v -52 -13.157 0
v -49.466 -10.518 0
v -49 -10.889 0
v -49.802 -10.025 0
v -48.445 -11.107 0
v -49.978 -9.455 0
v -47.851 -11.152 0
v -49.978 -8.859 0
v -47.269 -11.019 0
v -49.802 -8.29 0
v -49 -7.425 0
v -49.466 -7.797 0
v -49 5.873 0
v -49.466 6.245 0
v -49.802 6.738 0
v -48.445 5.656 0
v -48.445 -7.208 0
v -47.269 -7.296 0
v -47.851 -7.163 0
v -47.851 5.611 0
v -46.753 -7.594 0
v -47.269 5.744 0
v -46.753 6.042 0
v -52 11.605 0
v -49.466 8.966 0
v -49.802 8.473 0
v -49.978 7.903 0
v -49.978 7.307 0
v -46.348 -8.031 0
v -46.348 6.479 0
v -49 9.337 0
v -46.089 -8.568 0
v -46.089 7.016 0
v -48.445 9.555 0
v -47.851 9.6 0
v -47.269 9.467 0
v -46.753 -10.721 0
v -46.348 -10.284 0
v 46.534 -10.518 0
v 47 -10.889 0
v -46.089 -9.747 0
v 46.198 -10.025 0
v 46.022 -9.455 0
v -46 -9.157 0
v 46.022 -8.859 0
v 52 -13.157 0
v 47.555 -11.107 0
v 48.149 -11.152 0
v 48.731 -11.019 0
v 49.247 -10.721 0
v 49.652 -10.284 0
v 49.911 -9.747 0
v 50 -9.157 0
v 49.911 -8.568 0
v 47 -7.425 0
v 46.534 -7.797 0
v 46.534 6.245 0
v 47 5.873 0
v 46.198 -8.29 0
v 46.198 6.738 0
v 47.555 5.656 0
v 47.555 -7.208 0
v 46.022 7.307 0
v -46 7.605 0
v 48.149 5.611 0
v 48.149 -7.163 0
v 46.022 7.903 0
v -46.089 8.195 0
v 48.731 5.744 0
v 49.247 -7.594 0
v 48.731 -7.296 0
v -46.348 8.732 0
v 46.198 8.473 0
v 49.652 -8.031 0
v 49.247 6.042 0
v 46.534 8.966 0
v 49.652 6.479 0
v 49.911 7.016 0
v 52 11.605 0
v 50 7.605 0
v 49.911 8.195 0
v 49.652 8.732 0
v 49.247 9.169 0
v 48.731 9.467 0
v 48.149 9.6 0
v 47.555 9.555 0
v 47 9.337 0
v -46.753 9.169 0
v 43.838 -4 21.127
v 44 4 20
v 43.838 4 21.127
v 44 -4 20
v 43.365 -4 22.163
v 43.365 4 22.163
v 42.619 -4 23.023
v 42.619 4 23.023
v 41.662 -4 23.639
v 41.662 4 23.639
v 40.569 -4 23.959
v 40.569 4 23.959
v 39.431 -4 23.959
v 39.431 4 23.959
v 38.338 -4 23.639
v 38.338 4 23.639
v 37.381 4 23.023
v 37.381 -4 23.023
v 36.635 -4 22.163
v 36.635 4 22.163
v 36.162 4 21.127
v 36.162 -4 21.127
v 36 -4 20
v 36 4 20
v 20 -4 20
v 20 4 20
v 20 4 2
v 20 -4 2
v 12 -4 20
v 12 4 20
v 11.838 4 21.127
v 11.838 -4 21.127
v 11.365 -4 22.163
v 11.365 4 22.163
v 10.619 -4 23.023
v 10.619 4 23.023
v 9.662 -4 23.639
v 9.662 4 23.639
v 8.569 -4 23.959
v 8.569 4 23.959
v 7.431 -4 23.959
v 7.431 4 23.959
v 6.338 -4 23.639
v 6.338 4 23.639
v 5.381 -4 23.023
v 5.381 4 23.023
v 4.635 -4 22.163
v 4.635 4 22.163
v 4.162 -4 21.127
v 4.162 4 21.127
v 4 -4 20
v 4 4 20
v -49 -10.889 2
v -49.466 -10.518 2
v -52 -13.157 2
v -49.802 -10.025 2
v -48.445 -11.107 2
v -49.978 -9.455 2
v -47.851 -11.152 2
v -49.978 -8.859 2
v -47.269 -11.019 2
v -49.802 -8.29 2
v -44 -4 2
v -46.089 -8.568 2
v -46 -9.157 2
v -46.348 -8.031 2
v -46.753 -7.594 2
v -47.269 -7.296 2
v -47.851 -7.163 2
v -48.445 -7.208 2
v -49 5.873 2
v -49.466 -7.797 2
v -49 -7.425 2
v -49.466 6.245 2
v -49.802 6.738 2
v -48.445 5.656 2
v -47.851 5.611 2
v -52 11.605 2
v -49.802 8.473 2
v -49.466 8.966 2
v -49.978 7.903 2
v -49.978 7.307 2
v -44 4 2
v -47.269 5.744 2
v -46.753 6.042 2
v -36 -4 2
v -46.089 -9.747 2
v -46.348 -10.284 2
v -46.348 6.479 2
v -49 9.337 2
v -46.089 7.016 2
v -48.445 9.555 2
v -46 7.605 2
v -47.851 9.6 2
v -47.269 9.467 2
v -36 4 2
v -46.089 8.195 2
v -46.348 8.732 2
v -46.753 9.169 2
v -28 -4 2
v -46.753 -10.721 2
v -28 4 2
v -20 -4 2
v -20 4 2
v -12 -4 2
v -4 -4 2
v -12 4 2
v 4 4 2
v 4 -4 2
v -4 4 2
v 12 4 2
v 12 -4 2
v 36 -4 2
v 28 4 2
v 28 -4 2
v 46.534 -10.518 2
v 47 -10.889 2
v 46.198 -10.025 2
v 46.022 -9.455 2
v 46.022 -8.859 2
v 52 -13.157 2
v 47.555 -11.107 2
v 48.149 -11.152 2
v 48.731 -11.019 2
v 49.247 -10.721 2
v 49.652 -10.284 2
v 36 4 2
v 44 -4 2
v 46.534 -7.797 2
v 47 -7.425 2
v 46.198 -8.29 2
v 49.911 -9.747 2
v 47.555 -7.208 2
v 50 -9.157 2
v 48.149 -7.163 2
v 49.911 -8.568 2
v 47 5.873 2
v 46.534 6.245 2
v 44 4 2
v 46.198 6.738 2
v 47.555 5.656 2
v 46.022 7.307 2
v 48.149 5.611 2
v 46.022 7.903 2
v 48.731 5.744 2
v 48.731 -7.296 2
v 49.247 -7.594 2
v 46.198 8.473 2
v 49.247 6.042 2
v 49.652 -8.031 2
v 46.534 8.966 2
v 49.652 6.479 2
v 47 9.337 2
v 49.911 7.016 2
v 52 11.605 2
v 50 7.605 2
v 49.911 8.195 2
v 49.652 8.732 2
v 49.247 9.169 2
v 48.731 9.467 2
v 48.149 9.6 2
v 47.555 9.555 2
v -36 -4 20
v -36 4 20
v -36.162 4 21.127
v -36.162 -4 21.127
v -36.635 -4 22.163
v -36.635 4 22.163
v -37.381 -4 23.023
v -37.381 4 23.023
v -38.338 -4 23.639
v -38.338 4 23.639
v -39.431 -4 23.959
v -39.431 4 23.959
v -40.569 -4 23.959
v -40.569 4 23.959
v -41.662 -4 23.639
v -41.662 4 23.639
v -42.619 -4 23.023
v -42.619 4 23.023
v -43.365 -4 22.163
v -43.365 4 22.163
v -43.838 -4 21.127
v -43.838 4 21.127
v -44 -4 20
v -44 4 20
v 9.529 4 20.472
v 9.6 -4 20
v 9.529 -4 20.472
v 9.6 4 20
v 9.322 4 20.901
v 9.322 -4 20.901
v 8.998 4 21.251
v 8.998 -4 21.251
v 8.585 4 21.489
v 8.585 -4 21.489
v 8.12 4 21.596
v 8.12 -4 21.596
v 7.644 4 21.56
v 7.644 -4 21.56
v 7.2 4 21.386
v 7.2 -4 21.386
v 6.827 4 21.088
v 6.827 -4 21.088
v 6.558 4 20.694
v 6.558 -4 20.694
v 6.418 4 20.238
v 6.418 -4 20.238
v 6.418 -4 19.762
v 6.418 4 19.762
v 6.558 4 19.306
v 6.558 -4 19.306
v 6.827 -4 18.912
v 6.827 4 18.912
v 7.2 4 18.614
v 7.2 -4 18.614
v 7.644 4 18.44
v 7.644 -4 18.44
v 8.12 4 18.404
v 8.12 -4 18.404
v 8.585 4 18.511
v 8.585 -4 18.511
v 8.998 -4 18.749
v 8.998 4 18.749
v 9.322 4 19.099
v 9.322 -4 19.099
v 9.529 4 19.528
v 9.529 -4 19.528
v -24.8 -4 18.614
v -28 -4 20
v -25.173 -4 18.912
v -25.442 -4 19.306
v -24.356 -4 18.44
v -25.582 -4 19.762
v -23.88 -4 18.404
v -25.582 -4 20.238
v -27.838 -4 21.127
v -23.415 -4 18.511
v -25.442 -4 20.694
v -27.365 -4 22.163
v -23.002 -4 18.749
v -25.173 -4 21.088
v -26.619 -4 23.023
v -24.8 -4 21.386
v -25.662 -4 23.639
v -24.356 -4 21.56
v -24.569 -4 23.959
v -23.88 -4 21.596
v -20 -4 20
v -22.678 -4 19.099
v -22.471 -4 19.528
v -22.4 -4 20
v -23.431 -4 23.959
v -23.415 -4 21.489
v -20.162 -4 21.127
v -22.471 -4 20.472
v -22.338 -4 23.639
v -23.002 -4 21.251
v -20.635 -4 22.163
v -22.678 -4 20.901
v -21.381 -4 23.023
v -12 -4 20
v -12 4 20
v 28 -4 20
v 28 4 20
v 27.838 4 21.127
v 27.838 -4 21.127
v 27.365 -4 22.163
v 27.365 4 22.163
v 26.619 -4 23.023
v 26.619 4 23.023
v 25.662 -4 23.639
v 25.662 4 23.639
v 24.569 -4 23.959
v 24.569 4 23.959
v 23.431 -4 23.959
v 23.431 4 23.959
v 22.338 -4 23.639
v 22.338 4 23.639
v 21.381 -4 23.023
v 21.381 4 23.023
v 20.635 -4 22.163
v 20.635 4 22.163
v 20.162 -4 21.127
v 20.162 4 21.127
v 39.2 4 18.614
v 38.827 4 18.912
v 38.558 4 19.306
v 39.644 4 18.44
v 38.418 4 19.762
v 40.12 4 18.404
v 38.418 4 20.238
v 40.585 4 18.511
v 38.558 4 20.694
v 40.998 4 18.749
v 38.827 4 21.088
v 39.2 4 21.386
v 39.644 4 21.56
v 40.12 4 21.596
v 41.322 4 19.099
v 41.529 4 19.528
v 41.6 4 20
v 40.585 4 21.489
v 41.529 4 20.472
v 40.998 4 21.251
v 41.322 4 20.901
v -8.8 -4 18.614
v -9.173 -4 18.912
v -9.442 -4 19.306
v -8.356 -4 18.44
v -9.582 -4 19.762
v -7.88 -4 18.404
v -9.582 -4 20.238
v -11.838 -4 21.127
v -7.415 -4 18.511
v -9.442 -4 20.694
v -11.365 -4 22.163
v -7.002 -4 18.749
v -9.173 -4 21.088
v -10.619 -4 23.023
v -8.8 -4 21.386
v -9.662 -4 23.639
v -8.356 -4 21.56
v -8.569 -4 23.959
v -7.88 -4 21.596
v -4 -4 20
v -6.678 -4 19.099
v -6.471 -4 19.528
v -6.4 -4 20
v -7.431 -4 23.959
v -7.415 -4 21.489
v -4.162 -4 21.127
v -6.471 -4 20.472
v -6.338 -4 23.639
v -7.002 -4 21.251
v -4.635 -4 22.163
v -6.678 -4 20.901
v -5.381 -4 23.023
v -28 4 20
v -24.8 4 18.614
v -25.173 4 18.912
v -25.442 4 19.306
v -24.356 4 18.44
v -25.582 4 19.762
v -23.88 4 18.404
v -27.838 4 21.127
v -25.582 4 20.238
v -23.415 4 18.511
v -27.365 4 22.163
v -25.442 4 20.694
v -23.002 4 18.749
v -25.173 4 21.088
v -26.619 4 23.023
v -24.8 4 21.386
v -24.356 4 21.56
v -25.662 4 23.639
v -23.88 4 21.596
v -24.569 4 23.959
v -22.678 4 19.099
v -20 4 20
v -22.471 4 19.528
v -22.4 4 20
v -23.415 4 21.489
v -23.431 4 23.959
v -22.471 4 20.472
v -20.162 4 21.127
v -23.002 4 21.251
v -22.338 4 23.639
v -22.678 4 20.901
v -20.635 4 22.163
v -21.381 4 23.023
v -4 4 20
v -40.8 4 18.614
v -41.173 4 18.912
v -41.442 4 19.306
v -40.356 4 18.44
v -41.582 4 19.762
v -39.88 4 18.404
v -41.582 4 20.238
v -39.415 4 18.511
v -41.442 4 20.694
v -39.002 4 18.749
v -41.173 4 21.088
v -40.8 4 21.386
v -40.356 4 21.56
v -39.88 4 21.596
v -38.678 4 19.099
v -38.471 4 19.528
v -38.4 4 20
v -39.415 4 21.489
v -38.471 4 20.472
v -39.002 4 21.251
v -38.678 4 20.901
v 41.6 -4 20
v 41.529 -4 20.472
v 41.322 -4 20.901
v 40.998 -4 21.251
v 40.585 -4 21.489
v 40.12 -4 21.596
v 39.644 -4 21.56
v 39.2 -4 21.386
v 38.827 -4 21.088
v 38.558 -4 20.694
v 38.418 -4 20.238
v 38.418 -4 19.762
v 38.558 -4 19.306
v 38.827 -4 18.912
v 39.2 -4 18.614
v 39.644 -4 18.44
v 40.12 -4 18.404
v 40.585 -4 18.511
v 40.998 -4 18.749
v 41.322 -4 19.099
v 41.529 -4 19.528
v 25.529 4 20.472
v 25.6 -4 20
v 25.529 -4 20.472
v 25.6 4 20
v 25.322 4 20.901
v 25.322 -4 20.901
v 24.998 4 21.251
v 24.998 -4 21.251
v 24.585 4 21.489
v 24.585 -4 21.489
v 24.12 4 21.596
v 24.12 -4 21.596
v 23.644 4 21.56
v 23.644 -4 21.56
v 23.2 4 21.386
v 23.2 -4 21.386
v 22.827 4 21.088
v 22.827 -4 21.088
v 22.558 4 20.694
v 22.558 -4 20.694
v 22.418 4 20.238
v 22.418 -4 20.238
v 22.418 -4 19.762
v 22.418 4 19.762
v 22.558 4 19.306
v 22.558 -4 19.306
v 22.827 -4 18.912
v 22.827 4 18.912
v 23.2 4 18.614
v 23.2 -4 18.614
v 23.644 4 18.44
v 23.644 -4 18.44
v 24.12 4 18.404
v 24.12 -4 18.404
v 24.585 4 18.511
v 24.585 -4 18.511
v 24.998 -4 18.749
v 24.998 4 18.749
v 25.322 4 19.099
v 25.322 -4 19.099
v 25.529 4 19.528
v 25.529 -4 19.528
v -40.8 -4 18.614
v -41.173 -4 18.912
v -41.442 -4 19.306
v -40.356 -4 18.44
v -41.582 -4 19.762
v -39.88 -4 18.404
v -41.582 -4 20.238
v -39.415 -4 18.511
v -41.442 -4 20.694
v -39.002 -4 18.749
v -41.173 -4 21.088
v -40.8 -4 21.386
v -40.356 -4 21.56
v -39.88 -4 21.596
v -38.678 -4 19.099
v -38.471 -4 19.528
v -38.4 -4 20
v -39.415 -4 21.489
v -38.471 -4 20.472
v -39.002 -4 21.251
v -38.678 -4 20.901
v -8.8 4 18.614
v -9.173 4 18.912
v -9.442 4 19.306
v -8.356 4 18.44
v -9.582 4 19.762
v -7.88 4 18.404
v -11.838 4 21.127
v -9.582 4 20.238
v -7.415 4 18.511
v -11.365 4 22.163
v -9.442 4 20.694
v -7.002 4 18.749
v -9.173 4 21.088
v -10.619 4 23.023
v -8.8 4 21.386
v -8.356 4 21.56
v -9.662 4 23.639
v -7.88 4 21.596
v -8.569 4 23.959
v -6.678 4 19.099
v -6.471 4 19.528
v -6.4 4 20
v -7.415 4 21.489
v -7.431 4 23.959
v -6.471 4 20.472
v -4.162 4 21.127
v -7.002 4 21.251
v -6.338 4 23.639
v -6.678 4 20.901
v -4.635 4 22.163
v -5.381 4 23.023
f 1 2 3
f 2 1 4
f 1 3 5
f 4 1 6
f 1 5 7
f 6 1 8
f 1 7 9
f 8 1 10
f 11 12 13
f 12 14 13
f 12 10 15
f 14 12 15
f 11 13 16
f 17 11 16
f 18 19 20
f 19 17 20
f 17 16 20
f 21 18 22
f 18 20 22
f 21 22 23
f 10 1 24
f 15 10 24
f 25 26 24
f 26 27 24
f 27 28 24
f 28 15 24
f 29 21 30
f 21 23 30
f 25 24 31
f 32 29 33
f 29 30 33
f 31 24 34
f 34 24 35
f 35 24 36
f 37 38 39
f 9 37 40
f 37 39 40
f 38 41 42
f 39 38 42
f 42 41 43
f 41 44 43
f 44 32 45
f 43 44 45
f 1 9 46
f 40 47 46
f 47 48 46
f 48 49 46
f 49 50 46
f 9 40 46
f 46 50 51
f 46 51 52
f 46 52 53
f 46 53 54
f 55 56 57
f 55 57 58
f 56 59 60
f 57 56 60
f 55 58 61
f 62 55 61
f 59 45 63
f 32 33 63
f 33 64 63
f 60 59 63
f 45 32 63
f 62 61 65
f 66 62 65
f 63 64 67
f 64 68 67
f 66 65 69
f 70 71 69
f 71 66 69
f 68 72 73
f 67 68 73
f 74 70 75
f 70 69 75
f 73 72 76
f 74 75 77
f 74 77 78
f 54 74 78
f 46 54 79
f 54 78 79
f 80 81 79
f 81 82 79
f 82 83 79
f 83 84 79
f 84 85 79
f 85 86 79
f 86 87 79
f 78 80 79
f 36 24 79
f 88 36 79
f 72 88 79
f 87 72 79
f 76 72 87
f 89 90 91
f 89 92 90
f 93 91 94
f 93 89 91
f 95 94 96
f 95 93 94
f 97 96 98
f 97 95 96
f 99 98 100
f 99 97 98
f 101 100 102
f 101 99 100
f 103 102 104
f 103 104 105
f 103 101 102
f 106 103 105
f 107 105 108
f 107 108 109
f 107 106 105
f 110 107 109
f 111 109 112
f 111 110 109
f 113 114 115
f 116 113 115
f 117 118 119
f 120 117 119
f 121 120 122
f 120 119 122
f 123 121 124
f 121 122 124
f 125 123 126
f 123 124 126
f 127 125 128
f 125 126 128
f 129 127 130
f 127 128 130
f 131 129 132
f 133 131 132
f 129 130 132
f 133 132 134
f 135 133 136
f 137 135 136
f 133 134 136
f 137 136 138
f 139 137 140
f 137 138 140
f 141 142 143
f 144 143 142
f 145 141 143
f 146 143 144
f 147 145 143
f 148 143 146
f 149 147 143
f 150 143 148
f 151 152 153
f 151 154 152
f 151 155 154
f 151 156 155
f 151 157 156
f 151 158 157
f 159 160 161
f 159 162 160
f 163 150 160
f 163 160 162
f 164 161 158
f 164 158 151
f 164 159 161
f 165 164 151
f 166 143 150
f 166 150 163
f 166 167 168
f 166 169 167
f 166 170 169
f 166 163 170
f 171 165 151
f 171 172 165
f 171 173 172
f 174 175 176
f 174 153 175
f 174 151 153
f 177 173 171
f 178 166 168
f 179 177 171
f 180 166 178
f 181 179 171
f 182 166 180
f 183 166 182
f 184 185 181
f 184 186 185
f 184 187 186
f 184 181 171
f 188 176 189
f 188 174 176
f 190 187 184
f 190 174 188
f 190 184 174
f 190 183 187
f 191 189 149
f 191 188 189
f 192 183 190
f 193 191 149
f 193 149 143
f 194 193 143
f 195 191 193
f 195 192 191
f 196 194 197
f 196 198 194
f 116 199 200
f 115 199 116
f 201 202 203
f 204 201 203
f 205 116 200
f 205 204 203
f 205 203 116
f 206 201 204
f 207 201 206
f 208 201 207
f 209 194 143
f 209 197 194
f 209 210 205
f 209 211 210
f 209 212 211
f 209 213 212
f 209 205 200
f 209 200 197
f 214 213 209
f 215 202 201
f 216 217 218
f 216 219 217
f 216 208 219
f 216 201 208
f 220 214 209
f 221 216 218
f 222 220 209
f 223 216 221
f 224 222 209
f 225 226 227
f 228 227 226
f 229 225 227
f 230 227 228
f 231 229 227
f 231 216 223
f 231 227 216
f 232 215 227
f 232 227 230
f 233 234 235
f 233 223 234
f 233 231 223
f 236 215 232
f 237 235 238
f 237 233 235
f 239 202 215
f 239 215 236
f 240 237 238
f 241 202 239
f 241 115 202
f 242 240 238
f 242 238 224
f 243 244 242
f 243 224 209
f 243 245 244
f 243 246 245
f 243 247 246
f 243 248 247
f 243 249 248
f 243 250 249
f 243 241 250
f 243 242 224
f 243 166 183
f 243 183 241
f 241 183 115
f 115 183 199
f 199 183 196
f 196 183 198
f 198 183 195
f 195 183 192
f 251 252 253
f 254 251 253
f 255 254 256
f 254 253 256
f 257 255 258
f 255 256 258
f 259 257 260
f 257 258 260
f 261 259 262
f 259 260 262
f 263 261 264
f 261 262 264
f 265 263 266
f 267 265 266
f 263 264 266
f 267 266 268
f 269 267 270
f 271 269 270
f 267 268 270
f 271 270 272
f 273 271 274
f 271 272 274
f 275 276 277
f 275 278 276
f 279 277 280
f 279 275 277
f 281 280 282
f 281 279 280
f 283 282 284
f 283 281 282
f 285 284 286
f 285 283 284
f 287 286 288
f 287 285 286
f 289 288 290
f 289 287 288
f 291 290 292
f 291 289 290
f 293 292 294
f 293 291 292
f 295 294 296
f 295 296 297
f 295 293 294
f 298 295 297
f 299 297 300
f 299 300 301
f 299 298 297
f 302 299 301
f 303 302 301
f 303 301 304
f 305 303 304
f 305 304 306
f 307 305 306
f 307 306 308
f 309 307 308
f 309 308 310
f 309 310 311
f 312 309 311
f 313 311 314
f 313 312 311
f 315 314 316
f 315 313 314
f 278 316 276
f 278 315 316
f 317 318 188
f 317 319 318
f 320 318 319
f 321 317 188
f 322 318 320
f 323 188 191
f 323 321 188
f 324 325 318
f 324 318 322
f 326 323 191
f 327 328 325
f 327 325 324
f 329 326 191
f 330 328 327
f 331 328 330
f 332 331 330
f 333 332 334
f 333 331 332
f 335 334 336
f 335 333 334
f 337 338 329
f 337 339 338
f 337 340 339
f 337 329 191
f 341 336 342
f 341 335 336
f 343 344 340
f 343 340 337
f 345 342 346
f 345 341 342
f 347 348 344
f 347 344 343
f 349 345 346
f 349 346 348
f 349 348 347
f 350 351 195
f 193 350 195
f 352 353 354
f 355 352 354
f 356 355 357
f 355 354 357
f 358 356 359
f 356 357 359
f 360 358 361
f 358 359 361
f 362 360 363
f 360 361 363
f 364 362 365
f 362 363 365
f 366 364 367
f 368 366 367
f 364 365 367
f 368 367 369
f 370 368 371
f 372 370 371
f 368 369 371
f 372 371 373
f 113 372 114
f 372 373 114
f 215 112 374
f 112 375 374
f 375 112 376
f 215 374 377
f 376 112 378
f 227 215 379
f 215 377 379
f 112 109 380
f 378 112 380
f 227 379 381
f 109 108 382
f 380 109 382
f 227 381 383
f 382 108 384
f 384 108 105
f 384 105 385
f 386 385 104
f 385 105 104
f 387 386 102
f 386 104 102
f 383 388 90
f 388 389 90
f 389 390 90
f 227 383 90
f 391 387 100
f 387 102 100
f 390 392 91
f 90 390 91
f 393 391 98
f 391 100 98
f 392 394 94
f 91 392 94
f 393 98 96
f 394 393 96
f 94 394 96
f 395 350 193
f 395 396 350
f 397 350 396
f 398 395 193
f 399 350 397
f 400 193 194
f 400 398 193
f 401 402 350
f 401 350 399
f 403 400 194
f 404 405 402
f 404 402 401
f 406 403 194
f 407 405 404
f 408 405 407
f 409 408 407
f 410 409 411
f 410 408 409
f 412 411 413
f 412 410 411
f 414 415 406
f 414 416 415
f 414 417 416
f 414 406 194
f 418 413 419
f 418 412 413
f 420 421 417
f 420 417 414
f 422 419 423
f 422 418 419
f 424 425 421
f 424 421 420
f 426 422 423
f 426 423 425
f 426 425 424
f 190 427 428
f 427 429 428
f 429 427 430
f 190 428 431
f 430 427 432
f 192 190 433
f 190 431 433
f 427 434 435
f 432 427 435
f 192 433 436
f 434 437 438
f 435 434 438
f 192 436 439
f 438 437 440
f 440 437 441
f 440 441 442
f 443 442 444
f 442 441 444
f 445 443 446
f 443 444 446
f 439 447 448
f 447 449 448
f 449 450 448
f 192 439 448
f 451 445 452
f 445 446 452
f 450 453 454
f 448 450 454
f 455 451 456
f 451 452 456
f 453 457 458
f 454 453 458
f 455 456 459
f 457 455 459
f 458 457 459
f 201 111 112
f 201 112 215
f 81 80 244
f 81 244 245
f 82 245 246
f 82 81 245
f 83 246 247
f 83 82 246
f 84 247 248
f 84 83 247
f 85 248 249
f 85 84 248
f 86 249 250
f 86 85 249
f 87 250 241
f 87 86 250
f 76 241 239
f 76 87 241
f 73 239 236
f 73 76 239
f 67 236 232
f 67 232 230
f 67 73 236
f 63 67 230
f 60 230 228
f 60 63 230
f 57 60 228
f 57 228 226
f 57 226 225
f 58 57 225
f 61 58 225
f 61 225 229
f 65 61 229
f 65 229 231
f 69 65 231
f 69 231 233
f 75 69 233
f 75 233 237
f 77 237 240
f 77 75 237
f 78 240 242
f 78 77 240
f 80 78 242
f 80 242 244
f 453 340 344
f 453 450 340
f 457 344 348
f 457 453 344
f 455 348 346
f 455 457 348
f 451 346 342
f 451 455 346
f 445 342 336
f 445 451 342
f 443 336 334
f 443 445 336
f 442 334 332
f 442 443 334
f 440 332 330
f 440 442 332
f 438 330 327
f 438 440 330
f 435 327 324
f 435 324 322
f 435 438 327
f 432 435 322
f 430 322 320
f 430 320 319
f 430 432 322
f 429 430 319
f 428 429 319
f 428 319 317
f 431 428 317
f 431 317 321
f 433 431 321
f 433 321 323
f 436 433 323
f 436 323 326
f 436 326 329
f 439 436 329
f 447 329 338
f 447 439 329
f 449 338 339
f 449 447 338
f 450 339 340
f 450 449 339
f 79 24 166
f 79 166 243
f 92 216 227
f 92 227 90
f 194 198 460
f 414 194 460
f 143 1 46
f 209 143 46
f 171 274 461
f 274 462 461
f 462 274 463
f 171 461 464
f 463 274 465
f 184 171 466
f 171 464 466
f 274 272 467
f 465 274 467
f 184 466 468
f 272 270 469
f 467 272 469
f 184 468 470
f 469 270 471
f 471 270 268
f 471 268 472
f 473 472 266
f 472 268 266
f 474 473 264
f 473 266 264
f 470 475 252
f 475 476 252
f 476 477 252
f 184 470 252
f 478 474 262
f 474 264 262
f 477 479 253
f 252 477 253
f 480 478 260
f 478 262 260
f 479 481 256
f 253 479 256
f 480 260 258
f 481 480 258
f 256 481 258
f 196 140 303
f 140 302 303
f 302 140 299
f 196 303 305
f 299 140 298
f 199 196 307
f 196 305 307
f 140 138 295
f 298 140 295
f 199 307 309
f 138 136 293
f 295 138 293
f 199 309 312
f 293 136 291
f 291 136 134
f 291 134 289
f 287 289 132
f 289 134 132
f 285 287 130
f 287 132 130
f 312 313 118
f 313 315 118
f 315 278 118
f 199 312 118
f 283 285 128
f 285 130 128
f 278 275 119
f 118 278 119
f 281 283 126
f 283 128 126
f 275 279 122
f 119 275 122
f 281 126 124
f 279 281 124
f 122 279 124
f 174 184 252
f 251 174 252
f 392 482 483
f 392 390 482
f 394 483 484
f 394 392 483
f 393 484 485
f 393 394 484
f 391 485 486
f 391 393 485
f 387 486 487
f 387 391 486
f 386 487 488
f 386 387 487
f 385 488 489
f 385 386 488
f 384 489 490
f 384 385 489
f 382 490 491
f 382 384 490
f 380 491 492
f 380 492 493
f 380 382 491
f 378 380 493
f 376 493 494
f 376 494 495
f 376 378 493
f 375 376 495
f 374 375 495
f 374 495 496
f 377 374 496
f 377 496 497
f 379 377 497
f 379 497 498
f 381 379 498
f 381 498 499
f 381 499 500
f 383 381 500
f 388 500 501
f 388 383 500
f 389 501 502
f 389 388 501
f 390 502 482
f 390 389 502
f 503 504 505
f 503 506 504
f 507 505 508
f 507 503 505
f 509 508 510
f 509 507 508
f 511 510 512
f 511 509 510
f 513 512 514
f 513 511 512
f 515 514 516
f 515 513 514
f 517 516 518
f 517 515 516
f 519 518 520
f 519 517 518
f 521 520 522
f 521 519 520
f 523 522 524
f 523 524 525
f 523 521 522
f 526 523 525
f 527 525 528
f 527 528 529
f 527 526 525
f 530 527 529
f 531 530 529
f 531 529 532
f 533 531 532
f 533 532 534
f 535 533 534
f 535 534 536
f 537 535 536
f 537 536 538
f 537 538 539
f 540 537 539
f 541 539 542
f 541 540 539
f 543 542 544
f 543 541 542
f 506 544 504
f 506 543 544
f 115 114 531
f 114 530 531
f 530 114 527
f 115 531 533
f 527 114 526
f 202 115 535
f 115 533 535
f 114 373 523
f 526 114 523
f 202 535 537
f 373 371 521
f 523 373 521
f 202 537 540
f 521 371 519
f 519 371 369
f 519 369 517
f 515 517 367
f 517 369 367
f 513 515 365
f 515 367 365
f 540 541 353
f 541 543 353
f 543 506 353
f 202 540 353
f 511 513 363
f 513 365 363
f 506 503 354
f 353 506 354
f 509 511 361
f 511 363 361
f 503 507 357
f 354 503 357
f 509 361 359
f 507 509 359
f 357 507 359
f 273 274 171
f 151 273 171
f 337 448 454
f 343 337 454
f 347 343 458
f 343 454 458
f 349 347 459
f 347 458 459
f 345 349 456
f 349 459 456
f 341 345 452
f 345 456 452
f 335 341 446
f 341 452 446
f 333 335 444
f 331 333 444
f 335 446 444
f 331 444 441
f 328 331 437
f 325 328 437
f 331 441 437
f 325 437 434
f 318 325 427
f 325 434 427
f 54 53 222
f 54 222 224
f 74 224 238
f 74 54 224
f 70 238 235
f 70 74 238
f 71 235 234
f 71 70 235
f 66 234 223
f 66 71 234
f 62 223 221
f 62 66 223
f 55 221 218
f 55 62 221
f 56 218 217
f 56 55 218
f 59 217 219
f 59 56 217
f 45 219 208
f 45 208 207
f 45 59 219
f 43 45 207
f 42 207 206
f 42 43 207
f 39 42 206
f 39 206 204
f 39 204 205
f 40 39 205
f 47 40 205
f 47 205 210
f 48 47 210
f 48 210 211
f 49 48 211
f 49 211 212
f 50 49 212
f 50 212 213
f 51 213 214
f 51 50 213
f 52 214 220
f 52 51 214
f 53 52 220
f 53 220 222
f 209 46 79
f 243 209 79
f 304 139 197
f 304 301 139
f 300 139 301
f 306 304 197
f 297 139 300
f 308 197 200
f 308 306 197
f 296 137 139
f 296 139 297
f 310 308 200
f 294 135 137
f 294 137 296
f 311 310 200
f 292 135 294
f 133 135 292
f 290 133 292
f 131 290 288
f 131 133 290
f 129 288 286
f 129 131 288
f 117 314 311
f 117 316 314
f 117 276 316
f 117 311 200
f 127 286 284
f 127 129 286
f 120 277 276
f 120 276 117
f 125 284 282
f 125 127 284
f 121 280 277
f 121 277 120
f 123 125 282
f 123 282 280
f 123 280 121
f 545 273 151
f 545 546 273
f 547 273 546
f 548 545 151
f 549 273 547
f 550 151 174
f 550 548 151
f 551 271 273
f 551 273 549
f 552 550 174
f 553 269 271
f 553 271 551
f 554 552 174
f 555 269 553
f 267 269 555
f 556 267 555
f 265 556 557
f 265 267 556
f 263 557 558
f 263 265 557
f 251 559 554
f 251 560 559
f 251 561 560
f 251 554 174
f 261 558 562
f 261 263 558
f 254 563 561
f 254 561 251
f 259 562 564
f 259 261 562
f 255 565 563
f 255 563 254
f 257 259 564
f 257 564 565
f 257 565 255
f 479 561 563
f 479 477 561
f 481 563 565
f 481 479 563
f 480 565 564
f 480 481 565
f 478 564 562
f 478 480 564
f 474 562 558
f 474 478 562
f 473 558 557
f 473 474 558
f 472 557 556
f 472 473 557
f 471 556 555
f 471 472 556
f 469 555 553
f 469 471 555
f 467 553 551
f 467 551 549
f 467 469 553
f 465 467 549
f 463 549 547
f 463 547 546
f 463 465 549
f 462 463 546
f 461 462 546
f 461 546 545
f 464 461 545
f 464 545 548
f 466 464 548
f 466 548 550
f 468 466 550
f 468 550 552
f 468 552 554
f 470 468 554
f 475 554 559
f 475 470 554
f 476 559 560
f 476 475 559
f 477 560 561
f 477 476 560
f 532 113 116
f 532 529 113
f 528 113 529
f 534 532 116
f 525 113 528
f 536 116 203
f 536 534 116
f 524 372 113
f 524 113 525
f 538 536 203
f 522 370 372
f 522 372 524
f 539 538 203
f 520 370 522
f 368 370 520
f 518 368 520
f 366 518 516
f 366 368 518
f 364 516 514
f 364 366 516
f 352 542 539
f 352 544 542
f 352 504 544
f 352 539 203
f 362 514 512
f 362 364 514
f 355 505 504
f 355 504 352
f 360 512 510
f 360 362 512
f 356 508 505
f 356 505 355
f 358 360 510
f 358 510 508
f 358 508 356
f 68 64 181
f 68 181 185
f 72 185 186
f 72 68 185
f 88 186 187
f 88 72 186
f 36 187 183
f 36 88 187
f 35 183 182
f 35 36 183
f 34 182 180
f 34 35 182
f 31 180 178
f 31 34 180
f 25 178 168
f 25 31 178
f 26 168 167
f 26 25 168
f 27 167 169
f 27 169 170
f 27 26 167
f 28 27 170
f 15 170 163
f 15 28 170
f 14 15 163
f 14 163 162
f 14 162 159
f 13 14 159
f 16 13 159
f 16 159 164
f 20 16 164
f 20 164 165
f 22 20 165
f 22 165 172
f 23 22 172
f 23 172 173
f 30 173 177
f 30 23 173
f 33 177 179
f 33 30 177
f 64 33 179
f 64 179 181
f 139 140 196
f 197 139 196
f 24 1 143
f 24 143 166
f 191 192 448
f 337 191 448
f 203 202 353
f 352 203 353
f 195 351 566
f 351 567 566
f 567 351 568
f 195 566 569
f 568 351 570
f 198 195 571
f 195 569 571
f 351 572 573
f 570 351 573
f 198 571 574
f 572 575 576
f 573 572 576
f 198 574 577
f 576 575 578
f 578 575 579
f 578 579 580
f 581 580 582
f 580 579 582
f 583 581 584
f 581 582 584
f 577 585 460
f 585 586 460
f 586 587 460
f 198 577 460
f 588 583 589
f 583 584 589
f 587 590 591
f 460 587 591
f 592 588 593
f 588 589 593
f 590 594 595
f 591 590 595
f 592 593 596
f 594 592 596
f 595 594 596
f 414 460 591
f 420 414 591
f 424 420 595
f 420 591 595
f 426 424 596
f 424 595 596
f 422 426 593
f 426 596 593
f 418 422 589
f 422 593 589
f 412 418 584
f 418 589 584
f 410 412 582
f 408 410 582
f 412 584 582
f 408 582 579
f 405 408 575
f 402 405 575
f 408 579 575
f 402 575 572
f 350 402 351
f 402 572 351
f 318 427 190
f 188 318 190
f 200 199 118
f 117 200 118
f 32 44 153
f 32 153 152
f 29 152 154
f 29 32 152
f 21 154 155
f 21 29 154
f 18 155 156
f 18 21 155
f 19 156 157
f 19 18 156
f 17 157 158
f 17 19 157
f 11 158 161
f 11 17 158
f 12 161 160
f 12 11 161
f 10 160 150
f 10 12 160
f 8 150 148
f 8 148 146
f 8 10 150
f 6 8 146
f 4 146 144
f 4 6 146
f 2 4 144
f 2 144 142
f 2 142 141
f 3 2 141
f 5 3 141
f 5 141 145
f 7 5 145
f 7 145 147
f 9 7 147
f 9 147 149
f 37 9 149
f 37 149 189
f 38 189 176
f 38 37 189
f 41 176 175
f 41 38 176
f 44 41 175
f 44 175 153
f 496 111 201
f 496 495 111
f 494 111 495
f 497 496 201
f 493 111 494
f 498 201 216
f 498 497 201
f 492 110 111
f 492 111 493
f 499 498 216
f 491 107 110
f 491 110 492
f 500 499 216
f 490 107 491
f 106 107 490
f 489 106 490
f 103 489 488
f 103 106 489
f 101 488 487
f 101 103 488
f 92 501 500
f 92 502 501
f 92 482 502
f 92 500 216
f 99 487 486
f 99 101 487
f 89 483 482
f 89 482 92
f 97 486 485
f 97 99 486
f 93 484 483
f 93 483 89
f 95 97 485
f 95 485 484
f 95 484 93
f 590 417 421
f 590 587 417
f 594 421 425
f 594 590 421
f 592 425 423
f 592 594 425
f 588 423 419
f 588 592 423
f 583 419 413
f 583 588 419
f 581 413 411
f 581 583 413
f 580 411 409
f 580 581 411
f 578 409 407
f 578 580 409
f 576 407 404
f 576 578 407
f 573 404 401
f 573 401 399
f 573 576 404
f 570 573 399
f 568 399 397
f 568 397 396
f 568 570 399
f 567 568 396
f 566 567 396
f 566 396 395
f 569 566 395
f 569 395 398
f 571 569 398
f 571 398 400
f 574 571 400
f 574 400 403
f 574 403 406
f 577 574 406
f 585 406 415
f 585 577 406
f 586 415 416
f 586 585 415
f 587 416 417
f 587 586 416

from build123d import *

# Parameters (mm, degrees)
F0_W     = 104
F0_H     = 24.762767
F0_R     = 2
F1_DEPTH = 2
F2_R     = 1.6
F3_DEPTH = 4


with BuildPart() as f1:
    # F0 (on Top) → F1 (new body)
    with BuildSketch(Plane.XY):
        with Locations((0, -0.776007)):
            Rectangle(F0_W, F0_H)
        with Locations((-48, -9.15739)):
            Circle(F0_R, mode=Mode.SUBTRACT)
        with Locations((48, -9.15739)):
            Circle(F0_R, mode=Mode.SUBTRACT)
        with Locations((-48, 7.605377)):
            Circle(F0_R, mode=Mode.SUBTRACT)
        with Locations((48, 7.605377)):
            Circle(F0_R, mode=Mode.SUBTRACT)
    extrude(amount=F1_DEPTH)

    # F2 (on Front) → F3 (join, symmetric)
    with BuildSketch(Plane.XZ):
        with BuildLine():
            Line((-28, 20), (-28, 0))
            Line((-28, 0), (-20, 0))
            Line((-20, 0), (-20, 20))
            ThreePointArc((-20, 20), (-24, 16), (-28, 20))
        make_face()
        with BuildLine():
            ThreePointArc((-20, 20), (-24, 24), (-28, 20))
            ThreePointArc((-28, 20), (-24, 16), (-20, 20))
        make_face()
        with Locations((-24, 20)):
            Circle(F2_R, mode=Mode.SUBTRACT)
        with BuildLine():
            Line((20, 20), (20, 0))
            Line((20, 0), (28, 0))
            Line((28, 0), (28, 20))
            ThreePointArc((28, 20), (24, 16), (20, 20))
        make_face()
        with BuildLine():
            ThreePointArc((28, 20), (24, 24), (20, 20))
            ThreePointArc((20, 20), (24, 16), (28, 20))
        make_face()
        with Locations((24, 20)):
            Circle(F2_R, mode=Mode.SUBTRACT)
        with BuildLine():
            Line((-44, 20), (-44, 0))
            Line((-44, 0), (-36, 0))
            Line((-36, 0), (-36, 20))
            ThreePointArc((-36, 20), (-40, 16), (-44, 20))
        make_face()
        with BuildLine():
            ThreePointArc((-36, 20), (-40, 24), (-44, 20))
            ThreePointArc((-44, 20), (-40, 16), (-36, 20))
        make_face()
        with Locations((-40, 20)):
            Circle(F2_R, mode=Mode.SUBTRACT)
        with BuildLine():
            Line((-12, 20), (-12, 0))
            Line((-12, 0), (-4, 0))
            Line((-4, 0), (-4, 20))
            ThreePointArc((-4, 20), (-8, 16), (-12, 20))
        make_face()
        with BuildLine():
            ThreePointArc((-4, 20), (-8, 24), (-12, 20))
            ThreePointArc((-12, 20), (-8, 16), (-4, 20))
        make_face()
        with Locations((-8, 20)):
            Circle(F2_R, mode=Mode.SUBTRACT)
        with BuildLine():
            Line((4, 20), (4, 0))
            Line((4, 0), (12, 0))
            Line((12, 0), (12, 20))
            ThreePointArc((12, 20), (8, 16), (4, 20))
        make_face()
        with BuildLine():
            ThreePointArc((12, 20), (8, 24), (4, 20))
            ThreePointArc((4, 20), (8, 16), (12, 20))
        make_face()
        with Locations((8, 20)):
            Circle(F2_R, mode=Mode.SUBTRACT)
        with BuildLine():
            Line((36, 20), (36, 0))
            Line((36, 0), (44, 0))
            Line((44, 0), (44, 20))
            ThreePointArc((44, 20), (40, 16), (36, 20))
        make_face()
        with BuildLine():
            ThreePointArc((44, 20), (40, 24), (36, 20))
            ThreePointArc((36, 20), (40, 16), (44, 20))
        make_face()
        with Locations((40, 20)):
            Circle(F2_R, mode=Mode.SUBTRACT)
    extrude(amount=F3_DEPTH, both=True)


solid = f1.part
